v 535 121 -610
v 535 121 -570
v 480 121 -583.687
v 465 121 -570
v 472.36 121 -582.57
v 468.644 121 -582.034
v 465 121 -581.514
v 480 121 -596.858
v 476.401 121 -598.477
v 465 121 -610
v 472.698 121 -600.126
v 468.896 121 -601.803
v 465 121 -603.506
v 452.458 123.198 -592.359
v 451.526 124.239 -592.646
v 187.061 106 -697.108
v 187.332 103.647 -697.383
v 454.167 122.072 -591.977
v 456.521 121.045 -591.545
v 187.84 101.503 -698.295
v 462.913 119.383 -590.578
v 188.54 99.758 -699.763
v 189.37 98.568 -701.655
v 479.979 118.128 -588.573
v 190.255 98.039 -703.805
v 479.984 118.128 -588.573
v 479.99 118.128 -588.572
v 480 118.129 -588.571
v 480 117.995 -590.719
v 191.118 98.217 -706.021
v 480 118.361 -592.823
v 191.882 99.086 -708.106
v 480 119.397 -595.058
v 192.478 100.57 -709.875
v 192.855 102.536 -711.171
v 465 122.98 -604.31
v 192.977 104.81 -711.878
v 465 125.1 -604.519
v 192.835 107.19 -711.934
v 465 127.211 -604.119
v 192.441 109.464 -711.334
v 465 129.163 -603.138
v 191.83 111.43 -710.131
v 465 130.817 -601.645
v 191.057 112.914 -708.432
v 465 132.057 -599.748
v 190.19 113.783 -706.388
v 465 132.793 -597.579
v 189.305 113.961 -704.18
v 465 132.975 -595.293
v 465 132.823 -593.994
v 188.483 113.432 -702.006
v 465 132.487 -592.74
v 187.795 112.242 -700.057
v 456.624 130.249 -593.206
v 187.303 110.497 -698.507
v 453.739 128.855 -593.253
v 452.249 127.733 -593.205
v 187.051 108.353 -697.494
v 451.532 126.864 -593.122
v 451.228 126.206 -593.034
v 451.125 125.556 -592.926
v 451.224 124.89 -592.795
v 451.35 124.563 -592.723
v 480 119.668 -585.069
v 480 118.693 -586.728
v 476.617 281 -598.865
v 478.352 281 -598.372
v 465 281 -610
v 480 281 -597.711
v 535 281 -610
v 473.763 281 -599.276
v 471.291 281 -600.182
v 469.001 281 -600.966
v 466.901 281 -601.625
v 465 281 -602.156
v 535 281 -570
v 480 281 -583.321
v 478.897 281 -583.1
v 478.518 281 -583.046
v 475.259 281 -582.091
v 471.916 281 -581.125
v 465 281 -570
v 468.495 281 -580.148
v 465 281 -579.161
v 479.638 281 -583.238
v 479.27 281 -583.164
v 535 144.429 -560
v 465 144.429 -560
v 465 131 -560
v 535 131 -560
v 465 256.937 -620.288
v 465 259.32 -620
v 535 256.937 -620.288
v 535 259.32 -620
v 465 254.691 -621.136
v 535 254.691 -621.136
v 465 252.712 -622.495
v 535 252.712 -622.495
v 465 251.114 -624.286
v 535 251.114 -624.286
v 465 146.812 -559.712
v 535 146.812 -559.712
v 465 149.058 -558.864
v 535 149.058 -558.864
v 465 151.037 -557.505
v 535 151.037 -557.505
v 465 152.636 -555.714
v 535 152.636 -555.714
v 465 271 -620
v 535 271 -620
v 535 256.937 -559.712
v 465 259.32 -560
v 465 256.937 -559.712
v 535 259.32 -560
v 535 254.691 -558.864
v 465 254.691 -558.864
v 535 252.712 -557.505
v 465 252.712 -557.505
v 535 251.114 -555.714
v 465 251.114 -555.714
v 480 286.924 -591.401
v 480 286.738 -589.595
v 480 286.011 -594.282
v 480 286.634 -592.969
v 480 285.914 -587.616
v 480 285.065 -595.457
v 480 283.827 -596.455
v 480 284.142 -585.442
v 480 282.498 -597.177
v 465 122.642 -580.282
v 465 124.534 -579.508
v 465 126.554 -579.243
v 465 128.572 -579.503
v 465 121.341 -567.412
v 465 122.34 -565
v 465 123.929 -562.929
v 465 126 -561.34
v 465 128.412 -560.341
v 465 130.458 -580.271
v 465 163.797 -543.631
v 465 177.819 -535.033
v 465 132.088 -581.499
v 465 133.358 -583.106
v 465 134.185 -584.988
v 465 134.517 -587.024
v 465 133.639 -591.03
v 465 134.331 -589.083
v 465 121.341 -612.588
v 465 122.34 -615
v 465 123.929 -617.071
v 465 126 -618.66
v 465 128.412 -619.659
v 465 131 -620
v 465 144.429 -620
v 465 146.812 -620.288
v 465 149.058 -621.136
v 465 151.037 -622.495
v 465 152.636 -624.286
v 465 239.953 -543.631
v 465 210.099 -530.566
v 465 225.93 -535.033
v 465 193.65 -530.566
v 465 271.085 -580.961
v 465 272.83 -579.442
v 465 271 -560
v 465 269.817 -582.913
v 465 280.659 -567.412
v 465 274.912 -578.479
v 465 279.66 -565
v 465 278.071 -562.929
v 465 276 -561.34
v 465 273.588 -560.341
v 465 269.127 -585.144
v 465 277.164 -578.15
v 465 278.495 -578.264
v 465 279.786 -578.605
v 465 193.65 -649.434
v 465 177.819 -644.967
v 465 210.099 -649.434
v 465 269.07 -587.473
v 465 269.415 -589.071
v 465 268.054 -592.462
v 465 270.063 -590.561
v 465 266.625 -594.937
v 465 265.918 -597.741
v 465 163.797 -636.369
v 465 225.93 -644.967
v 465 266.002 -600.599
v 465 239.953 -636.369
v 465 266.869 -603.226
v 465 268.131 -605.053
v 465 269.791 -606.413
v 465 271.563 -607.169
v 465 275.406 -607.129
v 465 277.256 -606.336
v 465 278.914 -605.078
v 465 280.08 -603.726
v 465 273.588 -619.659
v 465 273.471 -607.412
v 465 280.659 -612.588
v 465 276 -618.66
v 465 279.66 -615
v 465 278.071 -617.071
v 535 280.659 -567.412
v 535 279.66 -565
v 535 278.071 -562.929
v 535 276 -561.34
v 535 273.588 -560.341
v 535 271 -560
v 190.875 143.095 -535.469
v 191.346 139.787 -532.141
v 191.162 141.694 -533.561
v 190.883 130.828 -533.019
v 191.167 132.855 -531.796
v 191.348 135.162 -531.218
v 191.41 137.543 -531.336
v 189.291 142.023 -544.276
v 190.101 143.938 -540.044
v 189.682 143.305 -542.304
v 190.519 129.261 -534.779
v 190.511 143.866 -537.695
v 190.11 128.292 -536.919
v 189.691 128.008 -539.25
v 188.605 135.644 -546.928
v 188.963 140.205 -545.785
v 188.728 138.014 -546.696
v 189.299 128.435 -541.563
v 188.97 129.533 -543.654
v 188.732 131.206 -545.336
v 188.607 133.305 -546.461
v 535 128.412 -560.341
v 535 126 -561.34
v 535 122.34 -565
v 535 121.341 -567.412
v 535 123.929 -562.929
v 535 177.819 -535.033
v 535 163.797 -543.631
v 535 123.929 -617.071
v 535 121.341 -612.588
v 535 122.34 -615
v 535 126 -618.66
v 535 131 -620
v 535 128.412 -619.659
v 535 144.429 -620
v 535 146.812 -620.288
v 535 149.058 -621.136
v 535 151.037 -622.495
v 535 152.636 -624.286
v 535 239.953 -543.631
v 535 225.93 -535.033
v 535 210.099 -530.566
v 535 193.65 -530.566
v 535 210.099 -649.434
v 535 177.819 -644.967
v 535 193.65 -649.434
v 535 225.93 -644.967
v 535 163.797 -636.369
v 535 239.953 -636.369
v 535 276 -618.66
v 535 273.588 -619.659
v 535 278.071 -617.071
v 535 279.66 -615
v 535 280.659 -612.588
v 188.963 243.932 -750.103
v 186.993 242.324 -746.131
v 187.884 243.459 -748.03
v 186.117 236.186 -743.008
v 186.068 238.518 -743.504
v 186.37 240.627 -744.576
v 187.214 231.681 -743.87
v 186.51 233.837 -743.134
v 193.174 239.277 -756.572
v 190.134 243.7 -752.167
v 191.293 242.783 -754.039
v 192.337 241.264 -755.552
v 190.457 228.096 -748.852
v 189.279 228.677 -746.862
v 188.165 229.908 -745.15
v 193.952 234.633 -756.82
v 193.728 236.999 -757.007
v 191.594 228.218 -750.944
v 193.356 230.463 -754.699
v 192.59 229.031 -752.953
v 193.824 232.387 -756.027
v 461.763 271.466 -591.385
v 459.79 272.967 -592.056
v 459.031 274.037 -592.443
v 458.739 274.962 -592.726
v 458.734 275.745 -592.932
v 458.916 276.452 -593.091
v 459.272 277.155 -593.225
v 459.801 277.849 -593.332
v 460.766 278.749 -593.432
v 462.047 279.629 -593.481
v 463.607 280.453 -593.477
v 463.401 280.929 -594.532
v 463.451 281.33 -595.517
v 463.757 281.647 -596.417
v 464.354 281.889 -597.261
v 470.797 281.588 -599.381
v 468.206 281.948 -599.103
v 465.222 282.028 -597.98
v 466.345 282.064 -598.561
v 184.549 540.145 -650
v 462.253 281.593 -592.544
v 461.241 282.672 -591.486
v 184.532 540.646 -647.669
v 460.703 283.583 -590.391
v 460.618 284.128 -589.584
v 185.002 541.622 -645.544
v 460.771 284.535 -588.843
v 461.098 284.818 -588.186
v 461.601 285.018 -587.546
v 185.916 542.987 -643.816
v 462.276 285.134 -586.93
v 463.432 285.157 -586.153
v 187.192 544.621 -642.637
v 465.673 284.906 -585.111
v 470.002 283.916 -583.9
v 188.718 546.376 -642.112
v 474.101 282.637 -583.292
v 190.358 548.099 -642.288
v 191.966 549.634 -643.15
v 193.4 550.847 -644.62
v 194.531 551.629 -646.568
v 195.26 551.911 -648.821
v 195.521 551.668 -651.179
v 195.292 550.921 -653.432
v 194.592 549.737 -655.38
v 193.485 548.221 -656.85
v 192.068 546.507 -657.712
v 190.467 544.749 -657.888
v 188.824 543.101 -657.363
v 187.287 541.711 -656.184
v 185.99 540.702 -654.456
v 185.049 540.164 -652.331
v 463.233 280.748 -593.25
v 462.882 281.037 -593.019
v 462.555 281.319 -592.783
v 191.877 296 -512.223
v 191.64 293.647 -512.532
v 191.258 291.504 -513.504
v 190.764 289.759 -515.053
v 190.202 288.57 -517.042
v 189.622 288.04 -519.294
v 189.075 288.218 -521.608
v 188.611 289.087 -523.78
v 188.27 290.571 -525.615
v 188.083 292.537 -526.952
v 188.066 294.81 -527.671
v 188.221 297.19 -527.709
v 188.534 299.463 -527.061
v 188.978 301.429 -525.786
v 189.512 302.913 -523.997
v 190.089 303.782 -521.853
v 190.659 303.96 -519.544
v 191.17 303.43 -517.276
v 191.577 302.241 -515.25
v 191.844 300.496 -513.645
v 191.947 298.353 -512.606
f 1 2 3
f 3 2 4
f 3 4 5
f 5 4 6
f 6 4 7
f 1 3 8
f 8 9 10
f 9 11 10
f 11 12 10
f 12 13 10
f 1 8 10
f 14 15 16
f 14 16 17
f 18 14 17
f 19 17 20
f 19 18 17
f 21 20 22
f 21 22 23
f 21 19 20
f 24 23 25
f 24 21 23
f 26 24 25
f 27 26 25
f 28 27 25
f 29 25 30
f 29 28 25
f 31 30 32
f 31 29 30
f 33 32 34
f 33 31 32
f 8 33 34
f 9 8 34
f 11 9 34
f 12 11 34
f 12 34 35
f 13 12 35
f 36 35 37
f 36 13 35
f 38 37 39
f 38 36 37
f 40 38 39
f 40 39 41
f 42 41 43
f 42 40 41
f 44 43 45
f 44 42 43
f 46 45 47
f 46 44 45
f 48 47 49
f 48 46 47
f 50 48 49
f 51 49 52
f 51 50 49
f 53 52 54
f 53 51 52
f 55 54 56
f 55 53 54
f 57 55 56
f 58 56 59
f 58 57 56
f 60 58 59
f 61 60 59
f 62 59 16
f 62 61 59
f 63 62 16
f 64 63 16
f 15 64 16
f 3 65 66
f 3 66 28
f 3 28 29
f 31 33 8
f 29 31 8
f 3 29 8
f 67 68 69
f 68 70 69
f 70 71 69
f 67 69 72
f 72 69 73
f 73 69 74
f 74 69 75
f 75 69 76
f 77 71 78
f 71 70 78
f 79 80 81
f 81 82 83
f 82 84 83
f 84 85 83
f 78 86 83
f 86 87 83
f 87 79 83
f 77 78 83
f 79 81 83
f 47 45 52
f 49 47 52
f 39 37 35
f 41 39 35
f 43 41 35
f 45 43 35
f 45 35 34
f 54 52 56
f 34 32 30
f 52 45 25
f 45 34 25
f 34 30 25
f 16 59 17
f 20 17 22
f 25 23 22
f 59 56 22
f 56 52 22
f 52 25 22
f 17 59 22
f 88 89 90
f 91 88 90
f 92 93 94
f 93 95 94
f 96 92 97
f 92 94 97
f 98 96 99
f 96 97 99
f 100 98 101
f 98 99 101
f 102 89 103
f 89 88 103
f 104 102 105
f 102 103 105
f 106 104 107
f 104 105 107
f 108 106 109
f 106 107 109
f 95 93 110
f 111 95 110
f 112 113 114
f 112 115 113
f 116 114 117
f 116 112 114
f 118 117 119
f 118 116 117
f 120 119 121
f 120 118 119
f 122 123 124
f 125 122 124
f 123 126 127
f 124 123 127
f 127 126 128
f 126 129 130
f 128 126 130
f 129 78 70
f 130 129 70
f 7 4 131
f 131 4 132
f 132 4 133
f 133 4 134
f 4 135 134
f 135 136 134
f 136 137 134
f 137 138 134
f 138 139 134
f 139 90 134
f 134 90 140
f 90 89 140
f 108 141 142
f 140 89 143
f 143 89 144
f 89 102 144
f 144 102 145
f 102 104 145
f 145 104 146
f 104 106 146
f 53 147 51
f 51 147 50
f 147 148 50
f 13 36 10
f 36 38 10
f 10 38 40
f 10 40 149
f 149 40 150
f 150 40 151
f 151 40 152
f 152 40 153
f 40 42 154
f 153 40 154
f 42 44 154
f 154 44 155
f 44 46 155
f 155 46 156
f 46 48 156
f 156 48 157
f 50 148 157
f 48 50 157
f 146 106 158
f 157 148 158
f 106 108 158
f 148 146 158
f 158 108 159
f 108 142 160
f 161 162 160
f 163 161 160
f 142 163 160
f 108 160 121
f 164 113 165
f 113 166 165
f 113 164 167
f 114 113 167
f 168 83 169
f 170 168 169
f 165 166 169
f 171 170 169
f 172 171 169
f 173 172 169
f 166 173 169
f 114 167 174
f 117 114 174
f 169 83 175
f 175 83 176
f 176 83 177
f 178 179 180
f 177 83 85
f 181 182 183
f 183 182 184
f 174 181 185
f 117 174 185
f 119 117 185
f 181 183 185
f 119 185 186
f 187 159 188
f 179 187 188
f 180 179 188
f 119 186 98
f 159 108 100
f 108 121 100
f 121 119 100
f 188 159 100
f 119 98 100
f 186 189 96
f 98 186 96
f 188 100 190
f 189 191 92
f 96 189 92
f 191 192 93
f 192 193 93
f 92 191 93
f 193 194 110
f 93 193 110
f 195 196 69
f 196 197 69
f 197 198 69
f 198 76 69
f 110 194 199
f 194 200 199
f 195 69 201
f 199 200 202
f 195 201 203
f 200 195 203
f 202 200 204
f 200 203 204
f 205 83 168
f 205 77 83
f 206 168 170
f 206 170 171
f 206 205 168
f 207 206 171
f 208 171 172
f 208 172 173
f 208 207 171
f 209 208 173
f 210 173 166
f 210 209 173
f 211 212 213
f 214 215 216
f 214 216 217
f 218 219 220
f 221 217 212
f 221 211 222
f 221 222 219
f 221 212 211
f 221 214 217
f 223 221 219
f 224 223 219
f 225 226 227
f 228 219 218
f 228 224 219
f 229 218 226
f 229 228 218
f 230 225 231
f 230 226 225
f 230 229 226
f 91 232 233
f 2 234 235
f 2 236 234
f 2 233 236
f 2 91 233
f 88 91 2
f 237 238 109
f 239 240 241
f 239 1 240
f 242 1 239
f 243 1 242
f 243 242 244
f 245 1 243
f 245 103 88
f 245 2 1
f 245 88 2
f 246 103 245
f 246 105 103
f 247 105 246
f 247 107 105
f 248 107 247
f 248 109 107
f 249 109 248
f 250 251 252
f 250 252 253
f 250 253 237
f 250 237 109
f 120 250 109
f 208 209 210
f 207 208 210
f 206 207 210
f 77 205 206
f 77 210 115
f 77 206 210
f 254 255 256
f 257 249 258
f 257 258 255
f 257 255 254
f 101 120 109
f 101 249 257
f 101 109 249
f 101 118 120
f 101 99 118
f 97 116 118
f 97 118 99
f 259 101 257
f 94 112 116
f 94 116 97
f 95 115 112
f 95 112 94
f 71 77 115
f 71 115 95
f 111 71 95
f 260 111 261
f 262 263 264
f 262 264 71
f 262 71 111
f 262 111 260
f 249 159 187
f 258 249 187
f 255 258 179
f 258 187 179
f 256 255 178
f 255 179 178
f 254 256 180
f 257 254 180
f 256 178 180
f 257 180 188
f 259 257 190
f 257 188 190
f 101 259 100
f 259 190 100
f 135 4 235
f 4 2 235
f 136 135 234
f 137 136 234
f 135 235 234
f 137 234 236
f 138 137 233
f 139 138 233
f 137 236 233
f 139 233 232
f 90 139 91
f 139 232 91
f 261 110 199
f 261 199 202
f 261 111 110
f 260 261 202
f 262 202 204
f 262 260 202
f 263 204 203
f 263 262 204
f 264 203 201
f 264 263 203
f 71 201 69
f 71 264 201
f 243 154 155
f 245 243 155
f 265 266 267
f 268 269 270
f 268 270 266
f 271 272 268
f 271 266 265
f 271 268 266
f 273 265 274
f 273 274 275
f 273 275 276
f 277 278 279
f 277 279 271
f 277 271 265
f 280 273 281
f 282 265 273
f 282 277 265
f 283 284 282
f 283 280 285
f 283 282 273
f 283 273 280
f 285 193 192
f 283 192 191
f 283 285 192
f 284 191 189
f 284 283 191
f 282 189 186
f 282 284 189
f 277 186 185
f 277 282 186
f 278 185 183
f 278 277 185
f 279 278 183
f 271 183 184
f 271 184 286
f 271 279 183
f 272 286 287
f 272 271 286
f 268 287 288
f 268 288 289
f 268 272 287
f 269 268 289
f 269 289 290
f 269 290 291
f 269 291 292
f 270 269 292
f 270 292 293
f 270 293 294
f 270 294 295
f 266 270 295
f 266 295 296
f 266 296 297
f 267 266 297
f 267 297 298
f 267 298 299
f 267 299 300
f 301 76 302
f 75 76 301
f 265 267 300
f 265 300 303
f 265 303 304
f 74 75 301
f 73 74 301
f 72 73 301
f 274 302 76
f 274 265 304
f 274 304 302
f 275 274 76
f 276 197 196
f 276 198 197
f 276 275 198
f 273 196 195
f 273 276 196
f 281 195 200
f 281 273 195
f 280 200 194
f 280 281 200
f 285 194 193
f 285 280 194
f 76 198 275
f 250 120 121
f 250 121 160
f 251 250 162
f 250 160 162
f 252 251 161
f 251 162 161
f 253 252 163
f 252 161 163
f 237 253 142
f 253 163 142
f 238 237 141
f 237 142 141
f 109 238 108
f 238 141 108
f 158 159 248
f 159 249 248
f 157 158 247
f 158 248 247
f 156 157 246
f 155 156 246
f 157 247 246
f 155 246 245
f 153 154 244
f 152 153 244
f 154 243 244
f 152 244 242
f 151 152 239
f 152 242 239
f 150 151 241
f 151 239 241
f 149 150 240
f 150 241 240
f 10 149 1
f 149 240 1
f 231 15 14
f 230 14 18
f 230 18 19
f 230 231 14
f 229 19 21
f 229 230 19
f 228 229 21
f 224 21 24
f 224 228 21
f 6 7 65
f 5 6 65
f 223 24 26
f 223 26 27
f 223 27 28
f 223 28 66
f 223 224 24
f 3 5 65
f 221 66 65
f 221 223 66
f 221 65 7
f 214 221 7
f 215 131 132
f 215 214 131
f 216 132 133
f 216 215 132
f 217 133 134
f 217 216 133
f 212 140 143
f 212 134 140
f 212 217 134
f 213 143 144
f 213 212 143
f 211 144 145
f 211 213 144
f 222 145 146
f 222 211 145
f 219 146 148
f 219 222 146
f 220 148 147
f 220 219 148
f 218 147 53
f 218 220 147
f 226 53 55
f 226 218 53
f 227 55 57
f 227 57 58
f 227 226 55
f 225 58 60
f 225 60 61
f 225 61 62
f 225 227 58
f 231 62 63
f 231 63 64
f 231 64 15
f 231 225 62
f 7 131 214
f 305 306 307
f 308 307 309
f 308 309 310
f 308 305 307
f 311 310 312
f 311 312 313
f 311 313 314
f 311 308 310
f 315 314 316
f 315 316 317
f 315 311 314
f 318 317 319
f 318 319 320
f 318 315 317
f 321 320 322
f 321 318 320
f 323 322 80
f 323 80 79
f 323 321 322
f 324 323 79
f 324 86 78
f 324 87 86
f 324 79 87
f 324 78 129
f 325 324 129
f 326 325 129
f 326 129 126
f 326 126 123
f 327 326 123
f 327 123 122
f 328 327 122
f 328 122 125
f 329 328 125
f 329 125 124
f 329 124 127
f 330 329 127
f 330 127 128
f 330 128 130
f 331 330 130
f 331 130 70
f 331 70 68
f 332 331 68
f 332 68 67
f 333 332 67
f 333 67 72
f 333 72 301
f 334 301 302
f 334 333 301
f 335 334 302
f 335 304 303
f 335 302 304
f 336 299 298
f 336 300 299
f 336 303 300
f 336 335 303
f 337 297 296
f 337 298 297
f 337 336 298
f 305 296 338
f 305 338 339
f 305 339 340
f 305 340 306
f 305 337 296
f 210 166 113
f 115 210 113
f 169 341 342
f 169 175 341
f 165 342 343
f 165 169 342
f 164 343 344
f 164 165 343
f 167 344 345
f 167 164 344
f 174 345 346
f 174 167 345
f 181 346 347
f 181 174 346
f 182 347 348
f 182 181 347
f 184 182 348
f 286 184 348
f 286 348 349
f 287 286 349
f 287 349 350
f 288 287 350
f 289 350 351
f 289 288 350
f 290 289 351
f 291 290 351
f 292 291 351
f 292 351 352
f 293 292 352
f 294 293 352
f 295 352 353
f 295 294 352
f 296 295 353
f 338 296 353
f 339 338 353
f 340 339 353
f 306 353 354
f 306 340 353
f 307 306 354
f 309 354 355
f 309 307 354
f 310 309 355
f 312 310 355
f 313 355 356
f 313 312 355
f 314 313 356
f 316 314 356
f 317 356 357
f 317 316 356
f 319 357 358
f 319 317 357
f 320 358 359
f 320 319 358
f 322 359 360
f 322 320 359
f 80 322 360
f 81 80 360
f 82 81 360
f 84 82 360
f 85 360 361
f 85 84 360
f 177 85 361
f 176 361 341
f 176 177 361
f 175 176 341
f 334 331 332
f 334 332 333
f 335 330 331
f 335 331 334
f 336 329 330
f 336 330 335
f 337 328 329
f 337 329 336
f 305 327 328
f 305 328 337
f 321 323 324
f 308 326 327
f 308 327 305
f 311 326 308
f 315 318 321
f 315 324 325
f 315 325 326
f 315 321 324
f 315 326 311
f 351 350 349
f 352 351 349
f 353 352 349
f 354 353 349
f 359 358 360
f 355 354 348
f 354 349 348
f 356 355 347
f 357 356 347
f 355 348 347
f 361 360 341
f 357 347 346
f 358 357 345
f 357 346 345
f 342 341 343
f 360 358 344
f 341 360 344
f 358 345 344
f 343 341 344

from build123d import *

# Parameters (mm, degrees)
SWEEP3_PROFILE_R    = 8
SWEEP4_PROFILE_R    = 8
SWEEP6_PROFILE_R    = 8
SKETCH80_W          = 50
SKETCH80_H          = 57.849509876
CUT_EXTRUDE1_DEPTH  = 300
SKETCH81_R          = 60
BOSS_EXTRUDE1_DEPTH = 70
FILLET1_R           = 10


with BuildPart() as part:
    # Sweep3: sweep along a curve in space
    with BuildLine() as sweep3_path:
        Line((480, 230, -590), (190, 190, -750))
        Line((480, 230, -590), (190, 250, -520))
    # Sweep3 profile (on start of the path) → Sweep3 (sweep)
    with BuildSketch(Plane(origin=(190, 250, -520), x_dir=(0.2346405331038965, 0, 0.9720822085732871), z_dir=(0.9699050900314443, -0.06689000620906493, -0.23411502173172755))):
        Circle(SWEEP3_PROFILE_R)
    sweep(path=sweep3_path.line, transition=Transition.RIGHT)

    # Sweep4: sweep along a curve in space
    with BuildLine() as sweep4_path:
        Line((480, 230, -590), (190, 500, -650))
    # Sweep4 profile (on start of the path) → Sweep4 (sweep)
    with BuildSketch(Plane(origin=(480, 230, -590), x_dir=(-0.6814185279188429, -0.7318939744313498, 0), z_dir=(-0.7236444363336271, 0.6737379234830321, -0.1497195385517849))):
        Circle(SWEEP4_PROFILE_R)
    sweep(path=sweep4_path.line)


with BuildPart() as body_2:
    # Sweep6: sweep along a curve in space
    with BuildLine() as sweep6_path:
        Line((480, 80, -590), (190, 90, -539.058512789))
        Line((480, 80, -590), (190, 60, -704.548891224))
    # Sweep6 profile (on start of the path) → Sweep6 (sweep)
    with BuildSketch(Plane(origin=(190, 60, -704.548891224), x_dir=(-0.3673752090170087, 0, 0.9300728228476033), z_dir=(0.9281653987551736, 0.0640114068107016, 0.3666217837932773))):
        Circle(SWEEP6_PROFILE_R)
    sweep(path=sweep6_path.line, transition=Transition.RIGHT)


with BuildPart() as cut_extrude1_tool:
    # Sketch80 → Cut-Extrude1 (new body)
    with BuildSketch(Plane(origin=(0, 0, 0), x_dir=(1, 0, 0), z_dir=(0, 1, 0))):
        with Locations((505, 590.170010545)):
            Rectangle(SKETCH80_W, SKETCH80_H)
    extrude(amount=CUT_EXTRUDE1_DEPTH)


with BuildPart() as part_1:
    add(part.part)

    # Cut-Extrude1: cut by cut_extrude1_tool
    add(cut_extrude1_tool.part, mode=Mode.SUBTRACT)

    # Sketch81 → Boss-Extrude1 (add)
    with BuildSketch(Plane(origin=(465, 0, 0), x_dir=(0, 0, -1), z_dir=(1, 0, 0))):
        with Locations((590, 155.874728278)):
            Circle(SKETCH81_R)
        with BuildLine():
            Line((620, 235), (560, 235))
            Line((560, 235), (560, 207.836252505))
            ThreePointArc((560, 207.836252505), (590, 215.874728278), (620, 207.836252505))
            Line((620, 207.836252505), (620, 235))
        make_face()
        with BuildLine():
            ThreePointArc((620, 103.91320405), (590, 95.874728278), (560, 103.91320405))
            Line((560, 103.91320405), (560, 75))
            Line((560, 75), (620, 75))
            Line((620, 75), (620, 103.91320405))
        make_face()
    extrude(amount=BOSS_EXTRUDE1_DEPTH)

    # Fillet1
    fillet1_edges = [part_1.edges().sort_by_distance(p)[0] for p in [
        (500, 235, -620),
        (500, 103.91320405, -620),
        (500, 207.836252505, -620),
        (500, 235, -560),
        (500, 207.836252505, -560),
        (500, 103.91320405, -560),
        (500, 75, -560),
        (500, 75, -620),
    ]]
    fillet(fillet1_edges, radius=FILLET1_R)


with BuildPart() as body_2_1:
    add(body_2.part)

    # Cut-Extrude1: cut by cut_extrude1_tool
    add(cut_extrude1_tool.part, mode=Mode.SUBTRACT)


with BuildPart() as part_2:
    add(part_1.part)

    # Combine1: union body 2
    add(body_2_1.part)


with BuildPart() as part_3:
    # Body-Move/Copy1: moved
    add(part_2.part.moved(Location((0, 46, 0))))


solid = part_3.part
